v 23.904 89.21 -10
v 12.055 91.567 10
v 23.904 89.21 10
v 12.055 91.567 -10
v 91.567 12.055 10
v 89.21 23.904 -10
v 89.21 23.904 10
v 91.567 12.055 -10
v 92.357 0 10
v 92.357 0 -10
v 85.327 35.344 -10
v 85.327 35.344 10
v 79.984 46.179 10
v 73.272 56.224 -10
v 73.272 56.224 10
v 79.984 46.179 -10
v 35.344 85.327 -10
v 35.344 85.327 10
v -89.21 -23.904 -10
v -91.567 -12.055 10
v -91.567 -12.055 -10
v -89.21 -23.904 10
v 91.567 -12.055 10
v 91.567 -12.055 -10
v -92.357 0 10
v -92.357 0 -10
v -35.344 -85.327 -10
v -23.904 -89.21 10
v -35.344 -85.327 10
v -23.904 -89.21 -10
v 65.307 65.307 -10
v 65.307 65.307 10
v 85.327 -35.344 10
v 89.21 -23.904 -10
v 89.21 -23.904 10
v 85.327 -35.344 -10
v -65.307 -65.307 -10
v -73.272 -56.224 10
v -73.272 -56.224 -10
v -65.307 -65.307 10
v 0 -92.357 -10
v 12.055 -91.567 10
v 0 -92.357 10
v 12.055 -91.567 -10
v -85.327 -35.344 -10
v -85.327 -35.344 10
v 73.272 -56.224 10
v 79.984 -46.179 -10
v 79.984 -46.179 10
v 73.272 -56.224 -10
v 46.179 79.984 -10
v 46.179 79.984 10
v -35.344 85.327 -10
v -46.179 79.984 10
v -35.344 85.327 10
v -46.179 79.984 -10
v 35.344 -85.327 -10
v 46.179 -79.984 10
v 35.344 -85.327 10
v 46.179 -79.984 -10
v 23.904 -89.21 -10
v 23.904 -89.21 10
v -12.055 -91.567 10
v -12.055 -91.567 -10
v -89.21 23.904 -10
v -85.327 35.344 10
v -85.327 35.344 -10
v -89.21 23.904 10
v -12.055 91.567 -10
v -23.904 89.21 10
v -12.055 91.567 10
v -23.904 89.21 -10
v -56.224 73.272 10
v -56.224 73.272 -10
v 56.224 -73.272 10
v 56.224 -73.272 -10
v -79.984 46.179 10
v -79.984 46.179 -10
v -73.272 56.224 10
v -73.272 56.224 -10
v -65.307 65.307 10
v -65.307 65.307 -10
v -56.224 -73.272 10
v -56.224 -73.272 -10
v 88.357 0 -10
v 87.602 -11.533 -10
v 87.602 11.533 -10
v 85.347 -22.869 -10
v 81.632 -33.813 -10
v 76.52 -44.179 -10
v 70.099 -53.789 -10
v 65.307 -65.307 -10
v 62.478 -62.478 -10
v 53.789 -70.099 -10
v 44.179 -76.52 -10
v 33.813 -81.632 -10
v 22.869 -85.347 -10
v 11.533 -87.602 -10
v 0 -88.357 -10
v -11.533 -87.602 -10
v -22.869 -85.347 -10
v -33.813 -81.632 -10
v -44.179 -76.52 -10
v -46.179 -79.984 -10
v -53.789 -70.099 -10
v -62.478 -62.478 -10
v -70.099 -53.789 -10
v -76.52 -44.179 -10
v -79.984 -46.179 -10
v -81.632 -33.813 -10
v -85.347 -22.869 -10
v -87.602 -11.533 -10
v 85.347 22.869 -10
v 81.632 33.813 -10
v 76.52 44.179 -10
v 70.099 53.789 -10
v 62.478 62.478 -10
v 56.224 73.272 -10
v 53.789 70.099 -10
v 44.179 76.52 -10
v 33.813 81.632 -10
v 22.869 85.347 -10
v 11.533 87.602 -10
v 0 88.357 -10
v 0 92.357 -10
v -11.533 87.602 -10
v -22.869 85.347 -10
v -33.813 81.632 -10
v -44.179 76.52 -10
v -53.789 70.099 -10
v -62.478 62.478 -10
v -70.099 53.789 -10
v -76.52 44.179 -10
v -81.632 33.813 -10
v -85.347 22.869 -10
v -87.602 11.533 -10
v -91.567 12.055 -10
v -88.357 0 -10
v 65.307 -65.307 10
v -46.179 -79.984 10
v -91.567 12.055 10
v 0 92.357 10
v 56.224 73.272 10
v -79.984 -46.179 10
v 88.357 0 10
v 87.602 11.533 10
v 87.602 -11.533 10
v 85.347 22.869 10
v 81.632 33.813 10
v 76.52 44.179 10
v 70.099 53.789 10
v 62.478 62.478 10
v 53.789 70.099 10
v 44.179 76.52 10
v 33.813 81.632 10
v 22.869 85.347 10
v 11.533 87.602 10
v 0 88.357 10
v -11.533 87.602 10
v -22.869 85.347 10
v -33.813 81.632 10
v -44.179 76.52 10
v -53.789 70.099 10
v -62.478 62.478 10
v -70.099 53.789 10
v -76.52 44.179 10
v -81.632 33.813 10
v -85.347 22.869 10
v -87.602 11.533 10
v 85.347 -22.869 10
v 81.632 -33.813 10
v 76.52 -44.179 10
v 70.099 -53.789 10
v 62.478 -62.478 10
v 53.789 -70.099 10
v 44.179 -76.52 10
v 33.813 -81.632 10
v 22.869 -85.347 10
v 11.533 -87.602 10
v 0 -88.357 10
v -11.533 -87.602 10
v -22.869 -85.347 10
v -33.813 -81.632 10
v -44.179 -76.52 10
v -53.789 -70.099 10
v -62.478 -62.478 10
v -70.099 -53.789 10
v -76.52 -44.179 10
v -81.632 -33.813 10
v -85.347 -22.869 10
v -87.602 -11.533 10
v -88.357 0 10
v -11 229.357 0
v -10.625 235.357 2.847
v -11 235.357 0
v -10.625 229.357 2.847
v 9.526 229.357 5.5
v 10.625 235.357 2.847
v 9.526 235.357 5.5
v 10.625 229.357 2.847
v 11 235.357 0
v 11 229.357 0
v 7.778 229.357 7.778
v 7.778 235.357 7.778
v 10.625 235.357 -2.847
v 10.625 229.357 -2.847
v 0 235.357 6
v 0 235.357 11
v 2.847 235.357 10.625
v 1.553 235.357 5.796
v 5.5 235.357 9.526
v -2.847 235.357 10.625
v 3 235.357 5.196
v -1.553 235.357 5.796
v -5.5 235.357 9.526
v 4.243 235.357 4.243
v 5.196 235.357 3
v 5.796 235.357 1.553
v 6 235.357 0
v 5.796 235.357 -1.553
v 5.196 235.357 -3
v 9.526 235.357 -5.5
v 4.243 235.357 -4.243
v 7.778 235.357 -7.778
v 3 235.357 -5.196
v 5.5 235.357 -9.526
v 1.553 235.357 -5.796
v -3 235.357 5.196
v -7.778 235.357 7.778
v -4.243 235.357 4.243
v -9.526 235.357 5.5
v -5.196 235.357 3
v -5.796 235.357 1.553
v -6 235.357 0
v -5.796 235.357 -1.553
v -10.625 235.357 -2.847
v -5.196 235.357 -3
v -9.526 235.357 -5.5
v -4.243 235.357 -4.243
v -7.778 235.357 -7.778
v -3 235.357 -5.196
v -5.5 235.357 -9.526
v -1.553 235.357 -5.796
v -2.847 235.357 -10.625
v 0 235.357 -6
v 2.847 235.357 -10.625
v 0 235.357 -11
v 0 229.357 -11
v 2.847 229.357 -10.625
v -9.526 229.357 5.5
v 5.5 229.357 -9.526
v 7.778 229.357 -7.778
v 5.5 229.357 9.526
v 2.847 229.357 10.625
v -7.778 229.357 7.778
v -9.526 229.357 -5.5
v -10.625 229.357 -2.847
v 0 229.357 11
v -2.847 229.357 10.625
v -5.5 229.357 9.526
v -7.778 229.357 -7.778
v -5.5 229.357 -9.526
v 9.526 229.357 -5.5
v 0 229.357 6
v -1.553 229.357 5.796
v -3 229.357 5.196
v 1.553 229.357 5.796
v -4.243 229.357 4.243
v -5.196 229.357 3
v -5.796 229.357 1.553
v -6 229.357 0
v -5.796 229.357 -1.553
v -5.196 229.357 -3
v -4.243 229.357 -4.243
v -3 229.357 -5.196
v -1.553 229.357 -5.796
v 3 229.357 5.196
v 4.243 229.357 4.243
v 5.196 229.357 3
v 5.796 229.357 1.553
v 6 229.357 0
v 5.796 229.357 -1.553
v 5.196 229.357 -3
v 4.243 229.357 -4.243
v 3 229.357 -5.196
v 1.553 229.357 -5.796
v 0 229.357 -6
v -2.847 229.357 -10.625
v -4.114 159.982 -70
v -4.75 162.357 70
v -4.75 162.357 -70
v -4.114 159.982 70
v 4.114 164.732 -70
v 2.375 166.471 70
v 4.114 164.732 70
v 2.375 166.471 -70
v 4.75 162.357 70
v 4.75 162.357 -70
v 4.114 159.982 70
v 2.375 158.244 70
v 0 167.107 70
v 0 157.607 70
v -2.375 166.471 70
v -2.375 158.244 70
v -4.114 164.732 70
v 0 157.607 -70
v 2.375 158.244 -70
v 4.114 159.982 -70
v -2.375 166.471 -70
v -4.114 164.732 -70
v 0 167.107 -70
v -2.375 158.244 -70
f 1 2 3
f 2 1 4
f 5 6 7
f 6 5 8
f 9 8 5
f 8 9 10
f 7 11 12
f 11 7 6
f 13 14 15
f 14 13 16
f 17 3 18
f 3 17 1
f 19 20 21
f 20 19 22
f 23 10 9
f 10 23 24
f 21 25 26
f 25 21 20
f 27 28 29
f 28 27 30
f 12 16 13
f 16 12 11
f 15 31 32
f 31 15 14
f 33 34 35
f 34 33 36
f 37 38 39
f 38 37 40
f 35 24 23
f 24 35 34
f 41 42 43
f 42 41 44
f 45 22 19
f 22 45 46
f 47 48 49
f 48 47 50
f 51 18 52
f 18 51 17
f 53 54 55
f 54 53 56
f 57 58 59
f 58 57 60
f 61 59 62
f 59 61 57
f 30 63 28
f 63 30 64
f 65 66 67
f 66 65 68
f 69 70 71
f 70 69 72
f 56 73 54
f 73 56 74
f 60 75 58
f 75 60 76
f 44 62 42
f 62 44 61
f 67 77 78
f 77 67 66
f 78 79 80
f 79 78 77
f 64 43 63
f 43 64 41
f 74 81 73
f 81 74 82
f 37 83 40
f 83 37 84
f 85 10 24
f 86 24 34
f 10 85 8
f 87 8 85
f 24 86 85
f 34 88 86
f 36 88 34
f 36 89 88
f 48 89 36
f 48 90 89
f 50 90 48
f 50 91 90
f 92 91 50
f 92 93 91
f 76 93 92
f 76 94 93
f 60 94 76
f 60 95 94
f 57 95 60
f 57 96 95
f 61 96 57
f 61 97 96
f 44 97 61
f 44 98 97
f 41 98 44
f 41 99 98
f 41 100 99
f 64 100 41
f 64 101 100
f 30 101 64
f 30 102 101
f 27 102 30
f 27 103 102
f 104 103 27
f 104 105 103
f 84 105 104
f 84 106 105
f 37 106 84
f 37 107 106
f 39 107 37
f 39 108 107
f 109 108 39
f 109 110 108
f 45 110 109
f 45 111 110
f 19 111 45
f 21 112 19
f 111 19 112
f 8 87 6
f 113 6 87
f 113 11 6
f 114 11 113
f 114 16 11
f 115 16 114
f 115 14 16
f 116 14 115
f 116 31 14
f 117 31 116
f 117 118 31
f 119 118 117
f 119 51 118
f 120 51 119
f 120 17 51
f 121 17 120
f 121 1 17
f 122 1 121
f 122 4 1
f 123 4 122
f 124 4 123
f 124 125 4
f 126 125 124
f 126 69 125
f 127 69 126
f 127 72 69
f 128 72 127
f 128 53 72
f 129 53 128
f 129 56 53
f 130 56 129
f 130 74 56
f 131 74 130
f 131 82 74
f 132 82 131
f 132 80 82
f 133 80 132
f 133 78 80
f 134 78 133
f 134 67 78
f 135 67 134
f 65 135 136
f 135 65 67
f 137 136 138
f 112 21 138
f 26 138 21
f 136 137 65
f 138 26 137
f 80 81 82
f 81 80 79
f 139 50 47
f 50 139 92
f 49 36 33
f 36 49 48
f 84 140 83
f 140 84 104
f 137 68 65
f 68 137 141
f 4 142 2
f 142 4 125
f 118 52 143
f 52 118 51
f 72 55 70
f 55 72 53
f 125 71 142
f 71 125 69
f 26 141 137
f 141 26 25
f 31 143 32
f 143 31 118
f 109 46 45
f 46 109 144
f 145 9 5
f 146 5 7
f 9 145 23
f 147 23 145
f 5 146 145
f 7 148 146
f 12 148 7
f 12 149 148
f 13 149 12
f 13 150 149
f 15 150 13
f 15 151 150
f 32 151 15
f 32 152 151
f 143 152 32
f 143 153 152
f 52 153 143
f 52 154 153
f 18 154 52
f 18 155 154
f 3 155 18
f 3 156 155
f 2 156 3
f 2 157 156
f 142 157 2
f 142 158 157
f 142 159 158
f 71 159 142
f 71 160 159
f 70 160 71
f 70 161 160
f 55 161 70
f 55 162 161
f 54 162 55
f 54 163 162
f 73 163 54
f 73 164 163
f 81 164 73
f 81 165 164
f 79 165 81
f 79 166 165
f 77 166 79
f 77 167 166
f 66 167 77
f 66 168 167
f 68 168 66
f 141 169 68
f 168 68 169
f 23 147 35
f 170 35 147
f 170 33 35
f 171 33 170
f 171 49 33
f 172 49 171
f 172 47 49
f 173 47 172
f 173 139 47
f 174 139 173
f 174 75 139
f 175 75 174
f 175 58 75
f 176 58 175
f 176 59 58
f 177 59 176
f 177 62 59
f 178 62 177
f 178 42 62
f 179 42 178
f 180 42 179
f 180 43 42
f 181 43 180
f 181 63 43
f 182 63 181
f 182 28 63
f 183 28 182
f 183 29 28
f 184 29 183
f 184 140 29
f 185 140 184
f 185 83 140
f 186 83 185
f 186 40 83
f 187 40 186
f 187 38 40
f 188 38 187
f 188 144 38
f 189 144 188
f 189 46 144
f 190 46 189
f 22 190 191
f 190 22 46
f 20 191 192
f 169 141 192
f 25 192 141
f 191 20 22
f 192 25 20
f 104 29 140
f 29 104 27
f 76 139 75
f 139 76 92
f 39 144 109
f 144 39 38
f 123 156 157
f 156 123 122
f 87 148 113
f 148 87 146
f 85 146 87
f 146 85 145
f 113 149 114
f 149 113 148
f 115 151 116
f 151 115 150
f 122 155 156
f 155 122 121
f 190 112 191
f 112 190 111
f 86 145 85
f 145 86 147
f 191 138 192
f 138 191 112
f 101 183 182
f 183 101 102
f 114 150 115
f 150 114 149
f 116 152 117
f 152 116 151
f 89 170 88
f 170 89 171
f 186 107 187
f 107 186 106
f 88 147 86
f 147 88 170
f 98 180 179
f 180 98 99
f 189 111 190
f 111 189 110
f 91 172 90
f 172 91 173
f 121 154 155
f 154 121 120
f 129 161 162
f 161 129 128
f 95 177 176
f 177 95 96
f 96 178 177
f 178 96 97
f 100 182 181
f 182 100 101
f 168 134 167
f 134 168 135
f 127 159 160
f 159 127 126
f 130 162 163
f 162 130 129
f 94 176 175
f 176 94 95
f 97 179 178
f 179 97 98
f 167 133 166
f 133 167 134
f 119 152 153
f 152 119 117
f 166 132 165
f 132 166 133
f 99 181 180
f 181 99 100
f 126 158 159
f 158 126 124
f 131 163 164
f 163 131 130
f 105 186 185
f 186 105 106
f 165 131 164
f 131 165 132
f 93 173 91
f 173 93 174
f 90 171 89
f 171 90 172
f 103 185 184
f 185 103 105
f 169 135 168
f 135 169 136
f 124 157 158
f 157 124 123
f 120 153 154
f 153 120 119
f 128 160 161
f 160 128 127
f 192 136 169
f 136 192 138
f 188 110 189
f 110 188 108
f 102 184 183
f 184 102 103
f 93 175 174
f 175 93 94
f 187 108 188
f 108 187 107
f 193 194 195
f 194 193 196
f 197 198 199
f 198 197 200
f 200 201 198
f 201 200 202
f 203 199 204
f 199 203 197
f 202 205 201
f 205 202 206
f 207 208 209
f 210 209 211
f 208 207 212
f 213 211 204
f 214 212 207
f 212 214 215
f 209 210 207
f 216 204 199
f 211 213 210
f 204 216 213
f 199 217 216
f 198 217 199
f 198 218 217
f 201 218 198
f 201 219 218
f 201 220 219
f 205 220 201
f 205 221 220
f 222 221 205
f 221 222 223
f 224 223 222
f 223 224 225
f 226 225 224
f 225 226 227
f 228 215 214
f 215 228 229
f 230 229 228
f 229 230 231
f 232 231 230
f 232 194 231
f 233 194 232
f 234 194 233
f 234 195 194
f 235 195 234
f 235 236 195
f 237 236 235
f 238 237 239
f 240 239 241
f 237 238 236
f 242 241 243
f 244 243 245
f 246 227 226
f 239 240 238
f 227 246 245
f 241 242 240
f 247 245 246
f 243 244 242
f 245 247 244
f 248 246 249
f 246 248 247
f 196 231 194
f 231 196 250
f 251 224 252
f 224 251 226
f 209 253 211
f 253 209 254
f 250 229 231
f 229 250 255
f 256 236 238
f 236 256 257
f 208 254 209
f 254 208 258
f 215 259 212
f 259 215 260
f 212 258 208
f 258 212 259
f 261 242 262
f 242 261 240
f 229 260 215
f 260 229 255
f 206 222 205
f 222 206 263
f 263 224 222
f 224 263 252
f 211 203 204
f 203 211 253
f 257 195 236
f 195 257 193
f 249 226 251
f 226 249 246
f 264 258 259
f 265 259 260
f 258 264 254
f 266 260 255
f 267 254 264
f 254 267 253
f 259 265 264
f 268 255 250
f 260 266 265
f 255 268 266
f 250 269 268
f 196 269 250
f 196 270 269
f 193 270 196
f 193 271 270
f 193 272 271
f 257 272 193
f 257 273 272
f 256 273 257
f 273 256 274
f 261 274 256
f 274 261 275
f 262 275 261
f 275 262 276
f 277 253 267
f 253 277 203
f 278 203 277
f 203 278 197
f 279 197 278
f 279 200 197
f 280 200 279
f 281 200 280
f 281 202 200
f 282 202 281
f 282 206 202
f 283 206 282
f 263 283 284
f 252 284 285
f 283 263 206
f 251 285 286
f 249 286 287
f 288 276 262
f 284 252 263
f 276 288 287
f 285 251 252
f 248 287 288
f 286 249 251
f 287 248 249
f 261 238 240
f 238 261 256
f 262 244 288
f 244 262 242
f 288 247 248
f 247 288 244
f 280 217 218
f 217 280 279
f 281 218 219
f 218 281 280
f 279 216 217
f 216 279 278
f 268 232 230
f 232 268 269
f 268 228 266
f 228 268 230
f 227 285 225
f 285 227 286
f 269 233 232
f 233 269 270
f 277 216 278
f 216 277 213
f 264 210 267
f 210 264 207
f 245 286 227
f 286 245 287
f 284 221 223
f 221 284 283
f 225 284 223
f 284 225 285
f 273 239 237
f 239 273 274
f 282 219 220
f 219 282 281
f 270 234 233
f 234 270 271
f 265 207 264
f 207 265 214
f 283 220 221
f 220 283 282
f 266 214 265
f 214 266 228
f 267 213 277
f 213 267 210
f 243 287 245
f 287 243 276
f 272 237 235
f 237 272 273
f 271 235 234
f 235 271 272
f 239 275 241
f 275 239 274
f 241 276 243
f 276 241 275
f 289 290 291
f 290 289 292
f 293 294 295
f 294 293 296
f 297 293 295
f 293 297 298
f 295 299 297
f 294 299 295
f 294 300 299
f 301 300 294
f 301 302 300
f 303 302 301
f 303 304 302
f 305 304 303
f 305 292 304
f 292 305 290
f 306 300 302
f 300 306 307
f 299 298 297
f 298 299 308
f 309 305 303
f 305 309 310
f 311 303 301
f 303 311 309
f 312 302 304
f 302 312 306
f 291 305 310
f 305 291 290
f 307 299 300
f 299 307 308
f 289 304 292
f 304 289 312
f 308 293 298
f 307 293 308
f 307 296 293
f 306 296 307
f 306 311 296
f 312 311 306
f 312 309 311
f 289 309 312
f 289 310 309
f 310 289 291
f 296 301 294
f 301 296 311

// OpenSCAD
// Auto-generated by scripts/author_from_manifest.py (Phase D.3).
// Source: data/phase_d_manifest.json (sku_intent='tolco-fig1-clevis-hanger-6in').
// Do not hand-edit — regenerate from the manifest.
//
// @part tolco_fig1_clevis_hanger_6in
// @kind hanger
// @category hanger.clevis
// @display-name "Tolco FIG 1 Clevis Hanger 6\""
// @mfg nvent_tolco
// @mfg-pn FIG_1_6in
// @listing UL
// @price-usd 10.25
// @install-minutes 4
// @crew journeyman
// @param size_in number default=6 label="Size" unit="in"
// @port pipe position=[0,0,0] direction=[0,1,0] style=grooved size_in=6 role=run_a

size_in = 6.0;

function od_mm(nps) =
    nps ==   1  ? 33.4 :
    nps == 1.25 ? 42.2 :
    nps == 1.5  ? 48.3 :
    nps ==   2  ? 60.3 :
    nps == 2.5  ? 73.0 :
    nps ==   3  ? 88.9 :
    nps ==   4  ? 114.3 :
    nps ==   6  ? 168.3 :
    nps ==   8  ? 219.1 : 60.3;

od = od_mm(size_in);
ring_id = od * 1.05;
ring_od = ring_id + 8;
strap_w = 20;
rod_len = 140;

union() {
    // Ring
    difference() {
        cylinder(h = strap_w, d = ring_od, center = true, $fn = 48);
        cylinder(h = strap_w + 1, d = ring_id, center = true, $fn = 48);
    }
    // Rod up +Y
    translate([0, rod_len/2 + ring_od/2, 0])
        cylinder(h = rod_len, d = 9.5, center = true, $fn = 12);
    // Top swivel eye
    translate([0, rod_len + ring_od/2, 0])
        rotate([90, 0, 0])
        difference() {
            cylinder(h = 6, d = 22, center = true, $fn = 24);
            cylinder(h = 8, d = 12, center = true, $fn = 24);
        }
}
